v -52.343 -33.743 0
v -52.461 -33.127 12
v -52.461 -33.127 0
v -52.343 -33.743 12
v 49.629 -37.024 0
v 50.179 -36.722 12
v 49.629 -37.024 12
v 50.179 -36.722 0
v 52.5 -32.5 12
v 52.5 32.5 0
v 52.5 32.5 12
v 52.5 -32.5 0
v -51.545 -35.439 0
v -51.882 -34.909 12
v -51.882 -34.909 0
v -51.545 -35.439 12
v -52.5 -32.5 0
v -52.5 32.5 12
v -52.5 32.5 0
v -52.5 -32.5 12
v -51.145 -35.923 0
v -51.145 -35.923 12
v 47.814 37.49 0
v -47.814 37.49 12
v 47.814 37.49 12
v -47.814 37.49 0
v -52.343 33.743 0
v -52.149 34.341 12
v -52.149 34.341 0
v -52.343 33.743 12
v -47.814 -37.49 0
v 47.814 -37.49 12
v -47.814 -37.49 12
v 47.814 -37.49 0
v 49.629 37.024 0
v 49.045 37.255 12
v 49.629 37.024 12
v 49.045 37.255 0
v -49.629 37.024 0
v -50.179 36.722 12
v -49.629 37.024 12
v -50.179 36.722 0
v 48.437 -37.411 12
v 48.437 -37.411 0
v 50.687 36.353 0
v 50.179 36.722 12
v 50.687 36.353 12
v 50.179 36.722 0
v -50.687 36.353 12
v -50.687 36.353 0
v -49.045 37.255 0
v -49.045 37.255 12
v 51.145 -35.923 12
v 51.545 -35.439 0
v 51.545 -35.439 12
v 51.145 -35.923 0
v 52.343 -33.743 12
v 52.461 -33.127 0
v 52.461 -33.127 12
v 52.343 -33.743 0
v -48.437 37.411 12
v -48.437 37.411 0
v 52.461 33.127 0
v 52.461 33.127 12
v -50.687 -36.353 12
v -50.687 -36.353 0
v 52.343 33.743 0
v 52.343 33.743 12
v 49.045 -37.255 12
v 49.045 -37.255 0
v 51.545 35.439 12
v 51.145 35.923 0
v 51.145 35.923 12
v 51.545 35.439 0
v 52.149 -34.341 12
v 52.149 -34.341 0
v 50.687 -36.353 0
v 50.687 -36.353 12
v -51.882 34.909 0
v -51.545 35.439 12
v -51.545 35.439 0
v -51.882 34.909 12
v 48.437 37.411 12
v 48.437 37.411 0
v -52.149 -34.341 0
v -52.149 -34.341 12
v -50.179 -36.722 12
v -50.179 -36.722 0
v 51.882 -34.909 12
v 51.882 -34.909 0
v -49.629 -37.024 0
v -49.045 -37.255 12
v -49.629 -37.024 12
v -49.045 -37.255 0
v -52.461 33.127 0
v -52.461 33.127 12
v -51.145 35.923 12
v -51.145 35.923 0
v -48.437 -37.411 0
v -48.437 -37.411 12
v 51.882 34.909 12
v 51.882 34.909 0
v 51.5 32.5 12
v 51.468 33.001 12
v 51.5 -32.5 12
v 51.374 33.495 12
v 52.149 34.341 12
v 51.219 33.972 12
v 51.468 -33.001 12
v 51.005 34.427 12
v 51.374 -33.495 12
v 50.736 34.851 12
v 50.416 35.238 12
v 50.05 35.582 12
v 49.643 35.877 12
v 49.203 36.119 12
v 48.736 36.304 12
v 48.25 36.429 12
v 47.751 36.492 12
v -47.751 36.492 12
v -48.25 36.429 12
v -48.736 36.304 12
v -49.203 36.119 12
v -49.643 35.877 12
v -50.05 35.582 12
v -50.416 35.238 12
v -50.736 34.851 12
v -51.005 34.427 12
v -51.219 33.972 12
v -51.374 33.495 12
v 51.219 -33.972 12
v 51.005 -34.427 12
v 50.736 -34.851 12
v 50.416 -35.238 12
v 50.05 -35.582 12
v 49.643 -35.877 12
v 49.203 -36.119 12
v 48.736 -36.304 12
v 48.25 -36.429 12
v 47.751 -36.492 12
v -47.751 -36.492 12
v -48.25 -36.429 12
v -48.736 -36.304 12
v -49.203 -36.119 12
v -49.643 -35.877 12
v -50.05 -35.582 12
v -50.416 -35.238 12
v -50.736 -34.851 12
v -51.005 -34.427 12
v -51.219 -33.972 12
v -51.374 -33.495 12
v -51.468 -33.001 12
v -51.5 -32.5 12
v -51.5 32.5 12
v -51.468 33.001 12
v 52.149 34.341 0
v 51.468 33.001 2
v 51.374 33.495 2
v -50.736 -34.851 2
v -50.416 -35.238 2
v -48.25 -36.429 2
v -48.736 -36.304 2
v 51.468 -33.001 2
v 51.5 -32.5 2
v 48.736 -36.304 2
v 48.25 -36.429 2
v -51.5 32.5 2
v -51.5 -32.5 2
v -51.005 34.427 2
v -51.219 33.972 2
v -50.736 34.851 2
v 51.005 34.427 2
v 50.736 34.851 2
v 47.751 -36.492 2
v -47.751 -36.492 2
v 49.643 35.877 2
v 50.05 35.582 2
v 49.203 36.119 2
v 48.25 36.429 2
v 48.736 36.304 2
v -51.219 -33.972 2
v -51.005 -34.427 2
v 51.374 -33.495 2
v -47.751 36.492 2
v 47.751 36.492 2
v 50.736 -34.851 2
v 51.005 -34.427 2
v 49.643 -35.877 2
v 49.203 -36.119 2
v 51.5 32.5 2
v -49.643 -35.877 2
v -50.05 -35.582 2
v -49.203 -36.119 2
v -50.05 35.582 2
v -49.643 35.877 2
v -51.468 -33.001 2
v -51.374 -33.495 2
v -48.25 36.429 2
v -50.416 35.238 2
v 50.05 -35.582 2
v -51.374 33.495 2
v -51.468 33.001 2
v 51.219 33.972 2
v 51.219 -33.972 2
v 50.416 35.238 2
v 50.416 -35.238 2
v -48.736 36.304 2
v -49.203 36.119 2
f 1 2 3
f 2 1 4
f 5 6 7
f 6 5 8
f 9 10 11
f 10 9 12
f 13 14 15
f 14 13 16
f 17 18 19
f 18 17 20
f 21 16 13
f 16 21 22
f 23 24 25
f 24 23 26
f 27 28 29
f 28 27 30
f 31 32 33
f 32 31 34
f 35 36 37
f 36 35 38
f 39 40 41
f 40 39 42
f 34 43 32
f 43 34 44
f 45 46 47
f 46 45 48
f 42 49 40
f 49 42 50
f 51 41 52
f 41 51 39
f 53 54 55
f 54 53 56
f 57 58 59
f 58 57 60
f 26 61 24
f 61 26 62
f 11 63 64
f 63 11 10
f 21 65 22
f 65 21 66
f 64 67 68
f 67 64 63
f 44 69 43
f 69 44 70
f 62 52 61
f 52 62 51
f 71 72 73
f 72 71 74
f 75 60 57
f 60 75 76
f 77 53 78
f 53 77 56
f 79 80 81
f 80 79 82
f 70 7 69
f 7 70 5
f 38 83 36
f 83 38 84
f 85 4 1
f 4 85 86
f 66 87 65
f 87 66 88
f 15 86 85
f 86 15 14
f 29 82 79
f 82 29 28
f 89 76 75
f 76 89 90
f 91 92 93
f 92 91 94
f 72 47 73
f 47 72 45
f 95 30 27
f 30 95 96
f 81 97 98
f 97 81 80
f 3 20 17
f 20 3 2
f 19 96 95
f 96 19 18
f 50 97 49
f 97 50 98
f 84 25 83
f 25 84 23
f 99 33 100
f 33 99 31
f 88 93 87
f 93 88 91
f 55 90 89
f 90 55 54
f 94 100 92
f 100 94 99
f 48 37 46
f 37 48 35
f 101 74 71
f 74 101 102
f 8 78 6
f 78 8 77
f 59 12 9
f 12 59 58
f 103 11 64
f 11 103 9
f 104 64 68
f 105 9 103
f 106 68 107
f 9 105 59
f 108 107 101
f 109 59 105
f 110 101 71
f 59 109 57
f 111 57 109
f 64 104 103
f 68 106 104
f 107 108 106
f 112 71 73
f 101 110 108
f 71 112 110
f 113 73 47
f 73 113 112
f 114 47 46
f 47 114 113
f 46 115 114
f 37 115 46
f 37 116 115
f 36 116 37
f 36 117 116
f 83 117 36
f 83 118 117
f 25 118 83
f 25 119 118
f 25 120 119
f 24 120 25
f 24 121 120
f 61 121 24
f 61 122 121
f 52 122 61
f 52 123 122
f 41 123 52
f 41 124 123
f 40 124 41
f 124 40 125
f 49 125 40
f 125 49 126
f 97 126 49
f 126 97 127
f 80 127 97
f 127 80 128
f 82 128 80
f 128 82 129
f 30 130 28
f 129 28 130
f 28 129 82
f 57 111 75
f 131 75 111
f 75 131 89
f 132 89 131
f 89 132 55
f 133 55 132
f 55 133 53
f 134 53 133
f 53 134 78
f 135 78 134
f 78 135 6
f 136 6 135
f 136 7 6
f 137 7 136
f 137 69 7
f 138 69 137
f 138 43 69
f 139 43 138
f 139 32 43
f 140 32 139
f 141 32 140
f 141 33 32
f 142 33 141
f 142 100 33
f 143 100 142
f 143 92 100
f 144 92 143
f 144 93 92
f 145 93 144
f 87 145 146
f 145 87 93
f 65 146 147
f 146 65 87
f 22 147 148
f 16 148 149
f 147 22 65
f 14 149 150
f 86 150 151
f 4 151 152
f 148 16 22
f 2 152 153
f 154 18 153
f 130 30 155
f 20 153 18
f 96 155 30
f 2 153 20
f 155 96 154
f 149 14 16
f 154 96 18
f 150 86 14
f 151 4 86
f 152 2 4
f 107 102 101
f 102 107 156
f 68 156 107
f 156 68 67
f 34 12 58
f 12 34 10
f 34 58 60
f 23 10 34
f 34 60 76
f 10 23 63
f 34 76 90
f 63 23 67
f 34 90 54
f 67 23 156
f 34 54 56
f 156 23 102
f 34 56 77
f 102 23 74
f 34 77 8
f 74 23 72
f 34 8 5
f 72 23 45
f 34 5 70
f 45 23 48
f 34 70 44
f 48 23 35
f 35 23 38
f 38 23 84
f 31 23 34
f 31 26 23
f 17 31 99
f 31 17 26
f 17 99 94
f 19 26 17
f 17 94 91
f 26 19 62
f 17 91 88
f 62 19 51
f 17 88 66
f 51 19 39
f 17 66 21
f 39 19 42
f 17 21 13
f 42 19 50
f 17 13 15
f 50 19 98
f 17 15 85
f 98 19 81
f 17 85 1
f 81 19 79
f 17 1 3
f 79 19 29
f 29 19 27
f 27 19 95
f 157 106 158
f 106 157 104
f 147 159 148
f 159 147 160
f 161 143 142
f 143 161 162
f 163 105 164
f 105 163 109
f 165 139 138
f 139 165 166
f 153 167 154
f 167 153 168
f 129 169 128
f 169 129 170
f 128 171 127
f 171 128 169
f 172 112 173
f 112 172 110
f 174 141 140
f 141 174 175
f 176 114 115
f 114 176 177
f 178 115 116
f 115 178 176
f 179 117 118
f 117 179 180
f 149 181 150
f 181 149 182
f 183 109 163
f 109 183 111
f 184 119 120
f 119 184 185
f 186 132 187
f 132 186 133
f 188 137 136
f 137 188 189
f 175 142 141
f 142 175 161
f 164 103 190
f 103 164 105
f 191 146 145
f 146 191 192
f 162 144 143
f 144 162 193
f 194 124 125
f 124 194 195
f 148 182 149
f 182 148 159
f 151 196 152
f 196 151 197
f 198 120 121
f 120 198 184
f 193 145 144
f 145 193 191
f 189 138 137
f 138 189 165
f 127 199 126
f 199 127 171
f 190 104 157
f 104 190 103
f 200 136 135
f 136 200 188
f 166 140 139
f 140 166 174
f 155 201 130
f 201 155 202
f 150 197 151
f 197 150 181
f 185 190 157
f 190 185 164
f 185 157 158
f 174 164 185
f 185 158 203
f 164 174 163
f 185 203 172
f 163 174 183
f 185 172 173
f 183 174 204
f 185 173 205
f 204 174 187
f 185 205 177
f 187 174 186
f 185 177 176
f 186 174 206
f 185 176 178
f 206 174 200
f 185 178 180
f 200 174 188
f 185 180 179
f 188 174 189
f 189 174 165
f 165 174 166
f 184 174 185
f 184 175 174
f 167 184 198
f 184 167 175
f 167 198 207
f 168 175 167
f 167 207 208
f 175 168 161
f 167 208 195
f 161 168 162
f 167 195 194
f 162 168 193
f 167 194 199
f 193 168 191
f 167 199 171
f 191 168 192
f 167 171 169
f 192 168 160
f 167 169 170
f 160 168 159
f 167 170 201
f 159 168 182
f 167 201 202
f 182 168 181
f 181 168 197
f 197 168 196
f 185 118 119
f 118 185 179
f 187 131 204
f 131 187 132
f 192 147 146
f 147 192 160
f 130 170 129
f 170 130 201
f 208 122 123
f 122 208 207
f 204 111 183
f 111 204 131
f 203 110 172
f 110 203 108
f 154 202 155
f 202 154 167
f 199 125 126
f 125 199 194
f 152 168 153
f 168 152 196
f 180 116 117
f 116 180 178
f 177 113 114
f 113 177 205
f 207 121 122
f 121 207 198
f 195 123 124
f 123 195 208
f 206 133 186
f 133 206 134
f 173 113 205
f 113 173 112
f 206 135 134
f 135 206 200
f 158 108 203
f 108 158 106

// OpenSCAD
$fn = 50;


difference() {
	union() {
		hull() {
			translate(v = [-47.5000000000, 32.5000000000, 0]) {
				cylinder(h = 12, r = 5);
			}
			translate(v = [47.5000000000, 32.5000000000, 0]) {
				cylinder(h = 12, r = 5);
			}
			translate(v = [-47.5000000000, -32.5000000000, 0]) {
				cylinder(h = 12, r = 5);
			}
			translate(v = [47.5000000000, -32.5000000000, 0]) {
				cylinder(h = 12, r = 5);
			}
		}
	}
	union() {
		translate(v = [0, 0, 2]) {
			hull() {
				translate(v = [-47.5000000000, 32.5000000000, 0]) {
					cylinder(h = 10, r = 4);
				}
				translate(v = [47.5000000000, 32.5000000000, 0]) {
					cylinder(h = 10, r = 4);
				}
				translate(v = [-47.5000000000, -32.5000000000, 0]) {
					cylinder(h = 10, r = 4);
				}
				translate(v = [47.5000000000, -32.5000000000, 0]) {
					cylinder(h = 10, r = 4);
				}
			}
		}
	}
}
